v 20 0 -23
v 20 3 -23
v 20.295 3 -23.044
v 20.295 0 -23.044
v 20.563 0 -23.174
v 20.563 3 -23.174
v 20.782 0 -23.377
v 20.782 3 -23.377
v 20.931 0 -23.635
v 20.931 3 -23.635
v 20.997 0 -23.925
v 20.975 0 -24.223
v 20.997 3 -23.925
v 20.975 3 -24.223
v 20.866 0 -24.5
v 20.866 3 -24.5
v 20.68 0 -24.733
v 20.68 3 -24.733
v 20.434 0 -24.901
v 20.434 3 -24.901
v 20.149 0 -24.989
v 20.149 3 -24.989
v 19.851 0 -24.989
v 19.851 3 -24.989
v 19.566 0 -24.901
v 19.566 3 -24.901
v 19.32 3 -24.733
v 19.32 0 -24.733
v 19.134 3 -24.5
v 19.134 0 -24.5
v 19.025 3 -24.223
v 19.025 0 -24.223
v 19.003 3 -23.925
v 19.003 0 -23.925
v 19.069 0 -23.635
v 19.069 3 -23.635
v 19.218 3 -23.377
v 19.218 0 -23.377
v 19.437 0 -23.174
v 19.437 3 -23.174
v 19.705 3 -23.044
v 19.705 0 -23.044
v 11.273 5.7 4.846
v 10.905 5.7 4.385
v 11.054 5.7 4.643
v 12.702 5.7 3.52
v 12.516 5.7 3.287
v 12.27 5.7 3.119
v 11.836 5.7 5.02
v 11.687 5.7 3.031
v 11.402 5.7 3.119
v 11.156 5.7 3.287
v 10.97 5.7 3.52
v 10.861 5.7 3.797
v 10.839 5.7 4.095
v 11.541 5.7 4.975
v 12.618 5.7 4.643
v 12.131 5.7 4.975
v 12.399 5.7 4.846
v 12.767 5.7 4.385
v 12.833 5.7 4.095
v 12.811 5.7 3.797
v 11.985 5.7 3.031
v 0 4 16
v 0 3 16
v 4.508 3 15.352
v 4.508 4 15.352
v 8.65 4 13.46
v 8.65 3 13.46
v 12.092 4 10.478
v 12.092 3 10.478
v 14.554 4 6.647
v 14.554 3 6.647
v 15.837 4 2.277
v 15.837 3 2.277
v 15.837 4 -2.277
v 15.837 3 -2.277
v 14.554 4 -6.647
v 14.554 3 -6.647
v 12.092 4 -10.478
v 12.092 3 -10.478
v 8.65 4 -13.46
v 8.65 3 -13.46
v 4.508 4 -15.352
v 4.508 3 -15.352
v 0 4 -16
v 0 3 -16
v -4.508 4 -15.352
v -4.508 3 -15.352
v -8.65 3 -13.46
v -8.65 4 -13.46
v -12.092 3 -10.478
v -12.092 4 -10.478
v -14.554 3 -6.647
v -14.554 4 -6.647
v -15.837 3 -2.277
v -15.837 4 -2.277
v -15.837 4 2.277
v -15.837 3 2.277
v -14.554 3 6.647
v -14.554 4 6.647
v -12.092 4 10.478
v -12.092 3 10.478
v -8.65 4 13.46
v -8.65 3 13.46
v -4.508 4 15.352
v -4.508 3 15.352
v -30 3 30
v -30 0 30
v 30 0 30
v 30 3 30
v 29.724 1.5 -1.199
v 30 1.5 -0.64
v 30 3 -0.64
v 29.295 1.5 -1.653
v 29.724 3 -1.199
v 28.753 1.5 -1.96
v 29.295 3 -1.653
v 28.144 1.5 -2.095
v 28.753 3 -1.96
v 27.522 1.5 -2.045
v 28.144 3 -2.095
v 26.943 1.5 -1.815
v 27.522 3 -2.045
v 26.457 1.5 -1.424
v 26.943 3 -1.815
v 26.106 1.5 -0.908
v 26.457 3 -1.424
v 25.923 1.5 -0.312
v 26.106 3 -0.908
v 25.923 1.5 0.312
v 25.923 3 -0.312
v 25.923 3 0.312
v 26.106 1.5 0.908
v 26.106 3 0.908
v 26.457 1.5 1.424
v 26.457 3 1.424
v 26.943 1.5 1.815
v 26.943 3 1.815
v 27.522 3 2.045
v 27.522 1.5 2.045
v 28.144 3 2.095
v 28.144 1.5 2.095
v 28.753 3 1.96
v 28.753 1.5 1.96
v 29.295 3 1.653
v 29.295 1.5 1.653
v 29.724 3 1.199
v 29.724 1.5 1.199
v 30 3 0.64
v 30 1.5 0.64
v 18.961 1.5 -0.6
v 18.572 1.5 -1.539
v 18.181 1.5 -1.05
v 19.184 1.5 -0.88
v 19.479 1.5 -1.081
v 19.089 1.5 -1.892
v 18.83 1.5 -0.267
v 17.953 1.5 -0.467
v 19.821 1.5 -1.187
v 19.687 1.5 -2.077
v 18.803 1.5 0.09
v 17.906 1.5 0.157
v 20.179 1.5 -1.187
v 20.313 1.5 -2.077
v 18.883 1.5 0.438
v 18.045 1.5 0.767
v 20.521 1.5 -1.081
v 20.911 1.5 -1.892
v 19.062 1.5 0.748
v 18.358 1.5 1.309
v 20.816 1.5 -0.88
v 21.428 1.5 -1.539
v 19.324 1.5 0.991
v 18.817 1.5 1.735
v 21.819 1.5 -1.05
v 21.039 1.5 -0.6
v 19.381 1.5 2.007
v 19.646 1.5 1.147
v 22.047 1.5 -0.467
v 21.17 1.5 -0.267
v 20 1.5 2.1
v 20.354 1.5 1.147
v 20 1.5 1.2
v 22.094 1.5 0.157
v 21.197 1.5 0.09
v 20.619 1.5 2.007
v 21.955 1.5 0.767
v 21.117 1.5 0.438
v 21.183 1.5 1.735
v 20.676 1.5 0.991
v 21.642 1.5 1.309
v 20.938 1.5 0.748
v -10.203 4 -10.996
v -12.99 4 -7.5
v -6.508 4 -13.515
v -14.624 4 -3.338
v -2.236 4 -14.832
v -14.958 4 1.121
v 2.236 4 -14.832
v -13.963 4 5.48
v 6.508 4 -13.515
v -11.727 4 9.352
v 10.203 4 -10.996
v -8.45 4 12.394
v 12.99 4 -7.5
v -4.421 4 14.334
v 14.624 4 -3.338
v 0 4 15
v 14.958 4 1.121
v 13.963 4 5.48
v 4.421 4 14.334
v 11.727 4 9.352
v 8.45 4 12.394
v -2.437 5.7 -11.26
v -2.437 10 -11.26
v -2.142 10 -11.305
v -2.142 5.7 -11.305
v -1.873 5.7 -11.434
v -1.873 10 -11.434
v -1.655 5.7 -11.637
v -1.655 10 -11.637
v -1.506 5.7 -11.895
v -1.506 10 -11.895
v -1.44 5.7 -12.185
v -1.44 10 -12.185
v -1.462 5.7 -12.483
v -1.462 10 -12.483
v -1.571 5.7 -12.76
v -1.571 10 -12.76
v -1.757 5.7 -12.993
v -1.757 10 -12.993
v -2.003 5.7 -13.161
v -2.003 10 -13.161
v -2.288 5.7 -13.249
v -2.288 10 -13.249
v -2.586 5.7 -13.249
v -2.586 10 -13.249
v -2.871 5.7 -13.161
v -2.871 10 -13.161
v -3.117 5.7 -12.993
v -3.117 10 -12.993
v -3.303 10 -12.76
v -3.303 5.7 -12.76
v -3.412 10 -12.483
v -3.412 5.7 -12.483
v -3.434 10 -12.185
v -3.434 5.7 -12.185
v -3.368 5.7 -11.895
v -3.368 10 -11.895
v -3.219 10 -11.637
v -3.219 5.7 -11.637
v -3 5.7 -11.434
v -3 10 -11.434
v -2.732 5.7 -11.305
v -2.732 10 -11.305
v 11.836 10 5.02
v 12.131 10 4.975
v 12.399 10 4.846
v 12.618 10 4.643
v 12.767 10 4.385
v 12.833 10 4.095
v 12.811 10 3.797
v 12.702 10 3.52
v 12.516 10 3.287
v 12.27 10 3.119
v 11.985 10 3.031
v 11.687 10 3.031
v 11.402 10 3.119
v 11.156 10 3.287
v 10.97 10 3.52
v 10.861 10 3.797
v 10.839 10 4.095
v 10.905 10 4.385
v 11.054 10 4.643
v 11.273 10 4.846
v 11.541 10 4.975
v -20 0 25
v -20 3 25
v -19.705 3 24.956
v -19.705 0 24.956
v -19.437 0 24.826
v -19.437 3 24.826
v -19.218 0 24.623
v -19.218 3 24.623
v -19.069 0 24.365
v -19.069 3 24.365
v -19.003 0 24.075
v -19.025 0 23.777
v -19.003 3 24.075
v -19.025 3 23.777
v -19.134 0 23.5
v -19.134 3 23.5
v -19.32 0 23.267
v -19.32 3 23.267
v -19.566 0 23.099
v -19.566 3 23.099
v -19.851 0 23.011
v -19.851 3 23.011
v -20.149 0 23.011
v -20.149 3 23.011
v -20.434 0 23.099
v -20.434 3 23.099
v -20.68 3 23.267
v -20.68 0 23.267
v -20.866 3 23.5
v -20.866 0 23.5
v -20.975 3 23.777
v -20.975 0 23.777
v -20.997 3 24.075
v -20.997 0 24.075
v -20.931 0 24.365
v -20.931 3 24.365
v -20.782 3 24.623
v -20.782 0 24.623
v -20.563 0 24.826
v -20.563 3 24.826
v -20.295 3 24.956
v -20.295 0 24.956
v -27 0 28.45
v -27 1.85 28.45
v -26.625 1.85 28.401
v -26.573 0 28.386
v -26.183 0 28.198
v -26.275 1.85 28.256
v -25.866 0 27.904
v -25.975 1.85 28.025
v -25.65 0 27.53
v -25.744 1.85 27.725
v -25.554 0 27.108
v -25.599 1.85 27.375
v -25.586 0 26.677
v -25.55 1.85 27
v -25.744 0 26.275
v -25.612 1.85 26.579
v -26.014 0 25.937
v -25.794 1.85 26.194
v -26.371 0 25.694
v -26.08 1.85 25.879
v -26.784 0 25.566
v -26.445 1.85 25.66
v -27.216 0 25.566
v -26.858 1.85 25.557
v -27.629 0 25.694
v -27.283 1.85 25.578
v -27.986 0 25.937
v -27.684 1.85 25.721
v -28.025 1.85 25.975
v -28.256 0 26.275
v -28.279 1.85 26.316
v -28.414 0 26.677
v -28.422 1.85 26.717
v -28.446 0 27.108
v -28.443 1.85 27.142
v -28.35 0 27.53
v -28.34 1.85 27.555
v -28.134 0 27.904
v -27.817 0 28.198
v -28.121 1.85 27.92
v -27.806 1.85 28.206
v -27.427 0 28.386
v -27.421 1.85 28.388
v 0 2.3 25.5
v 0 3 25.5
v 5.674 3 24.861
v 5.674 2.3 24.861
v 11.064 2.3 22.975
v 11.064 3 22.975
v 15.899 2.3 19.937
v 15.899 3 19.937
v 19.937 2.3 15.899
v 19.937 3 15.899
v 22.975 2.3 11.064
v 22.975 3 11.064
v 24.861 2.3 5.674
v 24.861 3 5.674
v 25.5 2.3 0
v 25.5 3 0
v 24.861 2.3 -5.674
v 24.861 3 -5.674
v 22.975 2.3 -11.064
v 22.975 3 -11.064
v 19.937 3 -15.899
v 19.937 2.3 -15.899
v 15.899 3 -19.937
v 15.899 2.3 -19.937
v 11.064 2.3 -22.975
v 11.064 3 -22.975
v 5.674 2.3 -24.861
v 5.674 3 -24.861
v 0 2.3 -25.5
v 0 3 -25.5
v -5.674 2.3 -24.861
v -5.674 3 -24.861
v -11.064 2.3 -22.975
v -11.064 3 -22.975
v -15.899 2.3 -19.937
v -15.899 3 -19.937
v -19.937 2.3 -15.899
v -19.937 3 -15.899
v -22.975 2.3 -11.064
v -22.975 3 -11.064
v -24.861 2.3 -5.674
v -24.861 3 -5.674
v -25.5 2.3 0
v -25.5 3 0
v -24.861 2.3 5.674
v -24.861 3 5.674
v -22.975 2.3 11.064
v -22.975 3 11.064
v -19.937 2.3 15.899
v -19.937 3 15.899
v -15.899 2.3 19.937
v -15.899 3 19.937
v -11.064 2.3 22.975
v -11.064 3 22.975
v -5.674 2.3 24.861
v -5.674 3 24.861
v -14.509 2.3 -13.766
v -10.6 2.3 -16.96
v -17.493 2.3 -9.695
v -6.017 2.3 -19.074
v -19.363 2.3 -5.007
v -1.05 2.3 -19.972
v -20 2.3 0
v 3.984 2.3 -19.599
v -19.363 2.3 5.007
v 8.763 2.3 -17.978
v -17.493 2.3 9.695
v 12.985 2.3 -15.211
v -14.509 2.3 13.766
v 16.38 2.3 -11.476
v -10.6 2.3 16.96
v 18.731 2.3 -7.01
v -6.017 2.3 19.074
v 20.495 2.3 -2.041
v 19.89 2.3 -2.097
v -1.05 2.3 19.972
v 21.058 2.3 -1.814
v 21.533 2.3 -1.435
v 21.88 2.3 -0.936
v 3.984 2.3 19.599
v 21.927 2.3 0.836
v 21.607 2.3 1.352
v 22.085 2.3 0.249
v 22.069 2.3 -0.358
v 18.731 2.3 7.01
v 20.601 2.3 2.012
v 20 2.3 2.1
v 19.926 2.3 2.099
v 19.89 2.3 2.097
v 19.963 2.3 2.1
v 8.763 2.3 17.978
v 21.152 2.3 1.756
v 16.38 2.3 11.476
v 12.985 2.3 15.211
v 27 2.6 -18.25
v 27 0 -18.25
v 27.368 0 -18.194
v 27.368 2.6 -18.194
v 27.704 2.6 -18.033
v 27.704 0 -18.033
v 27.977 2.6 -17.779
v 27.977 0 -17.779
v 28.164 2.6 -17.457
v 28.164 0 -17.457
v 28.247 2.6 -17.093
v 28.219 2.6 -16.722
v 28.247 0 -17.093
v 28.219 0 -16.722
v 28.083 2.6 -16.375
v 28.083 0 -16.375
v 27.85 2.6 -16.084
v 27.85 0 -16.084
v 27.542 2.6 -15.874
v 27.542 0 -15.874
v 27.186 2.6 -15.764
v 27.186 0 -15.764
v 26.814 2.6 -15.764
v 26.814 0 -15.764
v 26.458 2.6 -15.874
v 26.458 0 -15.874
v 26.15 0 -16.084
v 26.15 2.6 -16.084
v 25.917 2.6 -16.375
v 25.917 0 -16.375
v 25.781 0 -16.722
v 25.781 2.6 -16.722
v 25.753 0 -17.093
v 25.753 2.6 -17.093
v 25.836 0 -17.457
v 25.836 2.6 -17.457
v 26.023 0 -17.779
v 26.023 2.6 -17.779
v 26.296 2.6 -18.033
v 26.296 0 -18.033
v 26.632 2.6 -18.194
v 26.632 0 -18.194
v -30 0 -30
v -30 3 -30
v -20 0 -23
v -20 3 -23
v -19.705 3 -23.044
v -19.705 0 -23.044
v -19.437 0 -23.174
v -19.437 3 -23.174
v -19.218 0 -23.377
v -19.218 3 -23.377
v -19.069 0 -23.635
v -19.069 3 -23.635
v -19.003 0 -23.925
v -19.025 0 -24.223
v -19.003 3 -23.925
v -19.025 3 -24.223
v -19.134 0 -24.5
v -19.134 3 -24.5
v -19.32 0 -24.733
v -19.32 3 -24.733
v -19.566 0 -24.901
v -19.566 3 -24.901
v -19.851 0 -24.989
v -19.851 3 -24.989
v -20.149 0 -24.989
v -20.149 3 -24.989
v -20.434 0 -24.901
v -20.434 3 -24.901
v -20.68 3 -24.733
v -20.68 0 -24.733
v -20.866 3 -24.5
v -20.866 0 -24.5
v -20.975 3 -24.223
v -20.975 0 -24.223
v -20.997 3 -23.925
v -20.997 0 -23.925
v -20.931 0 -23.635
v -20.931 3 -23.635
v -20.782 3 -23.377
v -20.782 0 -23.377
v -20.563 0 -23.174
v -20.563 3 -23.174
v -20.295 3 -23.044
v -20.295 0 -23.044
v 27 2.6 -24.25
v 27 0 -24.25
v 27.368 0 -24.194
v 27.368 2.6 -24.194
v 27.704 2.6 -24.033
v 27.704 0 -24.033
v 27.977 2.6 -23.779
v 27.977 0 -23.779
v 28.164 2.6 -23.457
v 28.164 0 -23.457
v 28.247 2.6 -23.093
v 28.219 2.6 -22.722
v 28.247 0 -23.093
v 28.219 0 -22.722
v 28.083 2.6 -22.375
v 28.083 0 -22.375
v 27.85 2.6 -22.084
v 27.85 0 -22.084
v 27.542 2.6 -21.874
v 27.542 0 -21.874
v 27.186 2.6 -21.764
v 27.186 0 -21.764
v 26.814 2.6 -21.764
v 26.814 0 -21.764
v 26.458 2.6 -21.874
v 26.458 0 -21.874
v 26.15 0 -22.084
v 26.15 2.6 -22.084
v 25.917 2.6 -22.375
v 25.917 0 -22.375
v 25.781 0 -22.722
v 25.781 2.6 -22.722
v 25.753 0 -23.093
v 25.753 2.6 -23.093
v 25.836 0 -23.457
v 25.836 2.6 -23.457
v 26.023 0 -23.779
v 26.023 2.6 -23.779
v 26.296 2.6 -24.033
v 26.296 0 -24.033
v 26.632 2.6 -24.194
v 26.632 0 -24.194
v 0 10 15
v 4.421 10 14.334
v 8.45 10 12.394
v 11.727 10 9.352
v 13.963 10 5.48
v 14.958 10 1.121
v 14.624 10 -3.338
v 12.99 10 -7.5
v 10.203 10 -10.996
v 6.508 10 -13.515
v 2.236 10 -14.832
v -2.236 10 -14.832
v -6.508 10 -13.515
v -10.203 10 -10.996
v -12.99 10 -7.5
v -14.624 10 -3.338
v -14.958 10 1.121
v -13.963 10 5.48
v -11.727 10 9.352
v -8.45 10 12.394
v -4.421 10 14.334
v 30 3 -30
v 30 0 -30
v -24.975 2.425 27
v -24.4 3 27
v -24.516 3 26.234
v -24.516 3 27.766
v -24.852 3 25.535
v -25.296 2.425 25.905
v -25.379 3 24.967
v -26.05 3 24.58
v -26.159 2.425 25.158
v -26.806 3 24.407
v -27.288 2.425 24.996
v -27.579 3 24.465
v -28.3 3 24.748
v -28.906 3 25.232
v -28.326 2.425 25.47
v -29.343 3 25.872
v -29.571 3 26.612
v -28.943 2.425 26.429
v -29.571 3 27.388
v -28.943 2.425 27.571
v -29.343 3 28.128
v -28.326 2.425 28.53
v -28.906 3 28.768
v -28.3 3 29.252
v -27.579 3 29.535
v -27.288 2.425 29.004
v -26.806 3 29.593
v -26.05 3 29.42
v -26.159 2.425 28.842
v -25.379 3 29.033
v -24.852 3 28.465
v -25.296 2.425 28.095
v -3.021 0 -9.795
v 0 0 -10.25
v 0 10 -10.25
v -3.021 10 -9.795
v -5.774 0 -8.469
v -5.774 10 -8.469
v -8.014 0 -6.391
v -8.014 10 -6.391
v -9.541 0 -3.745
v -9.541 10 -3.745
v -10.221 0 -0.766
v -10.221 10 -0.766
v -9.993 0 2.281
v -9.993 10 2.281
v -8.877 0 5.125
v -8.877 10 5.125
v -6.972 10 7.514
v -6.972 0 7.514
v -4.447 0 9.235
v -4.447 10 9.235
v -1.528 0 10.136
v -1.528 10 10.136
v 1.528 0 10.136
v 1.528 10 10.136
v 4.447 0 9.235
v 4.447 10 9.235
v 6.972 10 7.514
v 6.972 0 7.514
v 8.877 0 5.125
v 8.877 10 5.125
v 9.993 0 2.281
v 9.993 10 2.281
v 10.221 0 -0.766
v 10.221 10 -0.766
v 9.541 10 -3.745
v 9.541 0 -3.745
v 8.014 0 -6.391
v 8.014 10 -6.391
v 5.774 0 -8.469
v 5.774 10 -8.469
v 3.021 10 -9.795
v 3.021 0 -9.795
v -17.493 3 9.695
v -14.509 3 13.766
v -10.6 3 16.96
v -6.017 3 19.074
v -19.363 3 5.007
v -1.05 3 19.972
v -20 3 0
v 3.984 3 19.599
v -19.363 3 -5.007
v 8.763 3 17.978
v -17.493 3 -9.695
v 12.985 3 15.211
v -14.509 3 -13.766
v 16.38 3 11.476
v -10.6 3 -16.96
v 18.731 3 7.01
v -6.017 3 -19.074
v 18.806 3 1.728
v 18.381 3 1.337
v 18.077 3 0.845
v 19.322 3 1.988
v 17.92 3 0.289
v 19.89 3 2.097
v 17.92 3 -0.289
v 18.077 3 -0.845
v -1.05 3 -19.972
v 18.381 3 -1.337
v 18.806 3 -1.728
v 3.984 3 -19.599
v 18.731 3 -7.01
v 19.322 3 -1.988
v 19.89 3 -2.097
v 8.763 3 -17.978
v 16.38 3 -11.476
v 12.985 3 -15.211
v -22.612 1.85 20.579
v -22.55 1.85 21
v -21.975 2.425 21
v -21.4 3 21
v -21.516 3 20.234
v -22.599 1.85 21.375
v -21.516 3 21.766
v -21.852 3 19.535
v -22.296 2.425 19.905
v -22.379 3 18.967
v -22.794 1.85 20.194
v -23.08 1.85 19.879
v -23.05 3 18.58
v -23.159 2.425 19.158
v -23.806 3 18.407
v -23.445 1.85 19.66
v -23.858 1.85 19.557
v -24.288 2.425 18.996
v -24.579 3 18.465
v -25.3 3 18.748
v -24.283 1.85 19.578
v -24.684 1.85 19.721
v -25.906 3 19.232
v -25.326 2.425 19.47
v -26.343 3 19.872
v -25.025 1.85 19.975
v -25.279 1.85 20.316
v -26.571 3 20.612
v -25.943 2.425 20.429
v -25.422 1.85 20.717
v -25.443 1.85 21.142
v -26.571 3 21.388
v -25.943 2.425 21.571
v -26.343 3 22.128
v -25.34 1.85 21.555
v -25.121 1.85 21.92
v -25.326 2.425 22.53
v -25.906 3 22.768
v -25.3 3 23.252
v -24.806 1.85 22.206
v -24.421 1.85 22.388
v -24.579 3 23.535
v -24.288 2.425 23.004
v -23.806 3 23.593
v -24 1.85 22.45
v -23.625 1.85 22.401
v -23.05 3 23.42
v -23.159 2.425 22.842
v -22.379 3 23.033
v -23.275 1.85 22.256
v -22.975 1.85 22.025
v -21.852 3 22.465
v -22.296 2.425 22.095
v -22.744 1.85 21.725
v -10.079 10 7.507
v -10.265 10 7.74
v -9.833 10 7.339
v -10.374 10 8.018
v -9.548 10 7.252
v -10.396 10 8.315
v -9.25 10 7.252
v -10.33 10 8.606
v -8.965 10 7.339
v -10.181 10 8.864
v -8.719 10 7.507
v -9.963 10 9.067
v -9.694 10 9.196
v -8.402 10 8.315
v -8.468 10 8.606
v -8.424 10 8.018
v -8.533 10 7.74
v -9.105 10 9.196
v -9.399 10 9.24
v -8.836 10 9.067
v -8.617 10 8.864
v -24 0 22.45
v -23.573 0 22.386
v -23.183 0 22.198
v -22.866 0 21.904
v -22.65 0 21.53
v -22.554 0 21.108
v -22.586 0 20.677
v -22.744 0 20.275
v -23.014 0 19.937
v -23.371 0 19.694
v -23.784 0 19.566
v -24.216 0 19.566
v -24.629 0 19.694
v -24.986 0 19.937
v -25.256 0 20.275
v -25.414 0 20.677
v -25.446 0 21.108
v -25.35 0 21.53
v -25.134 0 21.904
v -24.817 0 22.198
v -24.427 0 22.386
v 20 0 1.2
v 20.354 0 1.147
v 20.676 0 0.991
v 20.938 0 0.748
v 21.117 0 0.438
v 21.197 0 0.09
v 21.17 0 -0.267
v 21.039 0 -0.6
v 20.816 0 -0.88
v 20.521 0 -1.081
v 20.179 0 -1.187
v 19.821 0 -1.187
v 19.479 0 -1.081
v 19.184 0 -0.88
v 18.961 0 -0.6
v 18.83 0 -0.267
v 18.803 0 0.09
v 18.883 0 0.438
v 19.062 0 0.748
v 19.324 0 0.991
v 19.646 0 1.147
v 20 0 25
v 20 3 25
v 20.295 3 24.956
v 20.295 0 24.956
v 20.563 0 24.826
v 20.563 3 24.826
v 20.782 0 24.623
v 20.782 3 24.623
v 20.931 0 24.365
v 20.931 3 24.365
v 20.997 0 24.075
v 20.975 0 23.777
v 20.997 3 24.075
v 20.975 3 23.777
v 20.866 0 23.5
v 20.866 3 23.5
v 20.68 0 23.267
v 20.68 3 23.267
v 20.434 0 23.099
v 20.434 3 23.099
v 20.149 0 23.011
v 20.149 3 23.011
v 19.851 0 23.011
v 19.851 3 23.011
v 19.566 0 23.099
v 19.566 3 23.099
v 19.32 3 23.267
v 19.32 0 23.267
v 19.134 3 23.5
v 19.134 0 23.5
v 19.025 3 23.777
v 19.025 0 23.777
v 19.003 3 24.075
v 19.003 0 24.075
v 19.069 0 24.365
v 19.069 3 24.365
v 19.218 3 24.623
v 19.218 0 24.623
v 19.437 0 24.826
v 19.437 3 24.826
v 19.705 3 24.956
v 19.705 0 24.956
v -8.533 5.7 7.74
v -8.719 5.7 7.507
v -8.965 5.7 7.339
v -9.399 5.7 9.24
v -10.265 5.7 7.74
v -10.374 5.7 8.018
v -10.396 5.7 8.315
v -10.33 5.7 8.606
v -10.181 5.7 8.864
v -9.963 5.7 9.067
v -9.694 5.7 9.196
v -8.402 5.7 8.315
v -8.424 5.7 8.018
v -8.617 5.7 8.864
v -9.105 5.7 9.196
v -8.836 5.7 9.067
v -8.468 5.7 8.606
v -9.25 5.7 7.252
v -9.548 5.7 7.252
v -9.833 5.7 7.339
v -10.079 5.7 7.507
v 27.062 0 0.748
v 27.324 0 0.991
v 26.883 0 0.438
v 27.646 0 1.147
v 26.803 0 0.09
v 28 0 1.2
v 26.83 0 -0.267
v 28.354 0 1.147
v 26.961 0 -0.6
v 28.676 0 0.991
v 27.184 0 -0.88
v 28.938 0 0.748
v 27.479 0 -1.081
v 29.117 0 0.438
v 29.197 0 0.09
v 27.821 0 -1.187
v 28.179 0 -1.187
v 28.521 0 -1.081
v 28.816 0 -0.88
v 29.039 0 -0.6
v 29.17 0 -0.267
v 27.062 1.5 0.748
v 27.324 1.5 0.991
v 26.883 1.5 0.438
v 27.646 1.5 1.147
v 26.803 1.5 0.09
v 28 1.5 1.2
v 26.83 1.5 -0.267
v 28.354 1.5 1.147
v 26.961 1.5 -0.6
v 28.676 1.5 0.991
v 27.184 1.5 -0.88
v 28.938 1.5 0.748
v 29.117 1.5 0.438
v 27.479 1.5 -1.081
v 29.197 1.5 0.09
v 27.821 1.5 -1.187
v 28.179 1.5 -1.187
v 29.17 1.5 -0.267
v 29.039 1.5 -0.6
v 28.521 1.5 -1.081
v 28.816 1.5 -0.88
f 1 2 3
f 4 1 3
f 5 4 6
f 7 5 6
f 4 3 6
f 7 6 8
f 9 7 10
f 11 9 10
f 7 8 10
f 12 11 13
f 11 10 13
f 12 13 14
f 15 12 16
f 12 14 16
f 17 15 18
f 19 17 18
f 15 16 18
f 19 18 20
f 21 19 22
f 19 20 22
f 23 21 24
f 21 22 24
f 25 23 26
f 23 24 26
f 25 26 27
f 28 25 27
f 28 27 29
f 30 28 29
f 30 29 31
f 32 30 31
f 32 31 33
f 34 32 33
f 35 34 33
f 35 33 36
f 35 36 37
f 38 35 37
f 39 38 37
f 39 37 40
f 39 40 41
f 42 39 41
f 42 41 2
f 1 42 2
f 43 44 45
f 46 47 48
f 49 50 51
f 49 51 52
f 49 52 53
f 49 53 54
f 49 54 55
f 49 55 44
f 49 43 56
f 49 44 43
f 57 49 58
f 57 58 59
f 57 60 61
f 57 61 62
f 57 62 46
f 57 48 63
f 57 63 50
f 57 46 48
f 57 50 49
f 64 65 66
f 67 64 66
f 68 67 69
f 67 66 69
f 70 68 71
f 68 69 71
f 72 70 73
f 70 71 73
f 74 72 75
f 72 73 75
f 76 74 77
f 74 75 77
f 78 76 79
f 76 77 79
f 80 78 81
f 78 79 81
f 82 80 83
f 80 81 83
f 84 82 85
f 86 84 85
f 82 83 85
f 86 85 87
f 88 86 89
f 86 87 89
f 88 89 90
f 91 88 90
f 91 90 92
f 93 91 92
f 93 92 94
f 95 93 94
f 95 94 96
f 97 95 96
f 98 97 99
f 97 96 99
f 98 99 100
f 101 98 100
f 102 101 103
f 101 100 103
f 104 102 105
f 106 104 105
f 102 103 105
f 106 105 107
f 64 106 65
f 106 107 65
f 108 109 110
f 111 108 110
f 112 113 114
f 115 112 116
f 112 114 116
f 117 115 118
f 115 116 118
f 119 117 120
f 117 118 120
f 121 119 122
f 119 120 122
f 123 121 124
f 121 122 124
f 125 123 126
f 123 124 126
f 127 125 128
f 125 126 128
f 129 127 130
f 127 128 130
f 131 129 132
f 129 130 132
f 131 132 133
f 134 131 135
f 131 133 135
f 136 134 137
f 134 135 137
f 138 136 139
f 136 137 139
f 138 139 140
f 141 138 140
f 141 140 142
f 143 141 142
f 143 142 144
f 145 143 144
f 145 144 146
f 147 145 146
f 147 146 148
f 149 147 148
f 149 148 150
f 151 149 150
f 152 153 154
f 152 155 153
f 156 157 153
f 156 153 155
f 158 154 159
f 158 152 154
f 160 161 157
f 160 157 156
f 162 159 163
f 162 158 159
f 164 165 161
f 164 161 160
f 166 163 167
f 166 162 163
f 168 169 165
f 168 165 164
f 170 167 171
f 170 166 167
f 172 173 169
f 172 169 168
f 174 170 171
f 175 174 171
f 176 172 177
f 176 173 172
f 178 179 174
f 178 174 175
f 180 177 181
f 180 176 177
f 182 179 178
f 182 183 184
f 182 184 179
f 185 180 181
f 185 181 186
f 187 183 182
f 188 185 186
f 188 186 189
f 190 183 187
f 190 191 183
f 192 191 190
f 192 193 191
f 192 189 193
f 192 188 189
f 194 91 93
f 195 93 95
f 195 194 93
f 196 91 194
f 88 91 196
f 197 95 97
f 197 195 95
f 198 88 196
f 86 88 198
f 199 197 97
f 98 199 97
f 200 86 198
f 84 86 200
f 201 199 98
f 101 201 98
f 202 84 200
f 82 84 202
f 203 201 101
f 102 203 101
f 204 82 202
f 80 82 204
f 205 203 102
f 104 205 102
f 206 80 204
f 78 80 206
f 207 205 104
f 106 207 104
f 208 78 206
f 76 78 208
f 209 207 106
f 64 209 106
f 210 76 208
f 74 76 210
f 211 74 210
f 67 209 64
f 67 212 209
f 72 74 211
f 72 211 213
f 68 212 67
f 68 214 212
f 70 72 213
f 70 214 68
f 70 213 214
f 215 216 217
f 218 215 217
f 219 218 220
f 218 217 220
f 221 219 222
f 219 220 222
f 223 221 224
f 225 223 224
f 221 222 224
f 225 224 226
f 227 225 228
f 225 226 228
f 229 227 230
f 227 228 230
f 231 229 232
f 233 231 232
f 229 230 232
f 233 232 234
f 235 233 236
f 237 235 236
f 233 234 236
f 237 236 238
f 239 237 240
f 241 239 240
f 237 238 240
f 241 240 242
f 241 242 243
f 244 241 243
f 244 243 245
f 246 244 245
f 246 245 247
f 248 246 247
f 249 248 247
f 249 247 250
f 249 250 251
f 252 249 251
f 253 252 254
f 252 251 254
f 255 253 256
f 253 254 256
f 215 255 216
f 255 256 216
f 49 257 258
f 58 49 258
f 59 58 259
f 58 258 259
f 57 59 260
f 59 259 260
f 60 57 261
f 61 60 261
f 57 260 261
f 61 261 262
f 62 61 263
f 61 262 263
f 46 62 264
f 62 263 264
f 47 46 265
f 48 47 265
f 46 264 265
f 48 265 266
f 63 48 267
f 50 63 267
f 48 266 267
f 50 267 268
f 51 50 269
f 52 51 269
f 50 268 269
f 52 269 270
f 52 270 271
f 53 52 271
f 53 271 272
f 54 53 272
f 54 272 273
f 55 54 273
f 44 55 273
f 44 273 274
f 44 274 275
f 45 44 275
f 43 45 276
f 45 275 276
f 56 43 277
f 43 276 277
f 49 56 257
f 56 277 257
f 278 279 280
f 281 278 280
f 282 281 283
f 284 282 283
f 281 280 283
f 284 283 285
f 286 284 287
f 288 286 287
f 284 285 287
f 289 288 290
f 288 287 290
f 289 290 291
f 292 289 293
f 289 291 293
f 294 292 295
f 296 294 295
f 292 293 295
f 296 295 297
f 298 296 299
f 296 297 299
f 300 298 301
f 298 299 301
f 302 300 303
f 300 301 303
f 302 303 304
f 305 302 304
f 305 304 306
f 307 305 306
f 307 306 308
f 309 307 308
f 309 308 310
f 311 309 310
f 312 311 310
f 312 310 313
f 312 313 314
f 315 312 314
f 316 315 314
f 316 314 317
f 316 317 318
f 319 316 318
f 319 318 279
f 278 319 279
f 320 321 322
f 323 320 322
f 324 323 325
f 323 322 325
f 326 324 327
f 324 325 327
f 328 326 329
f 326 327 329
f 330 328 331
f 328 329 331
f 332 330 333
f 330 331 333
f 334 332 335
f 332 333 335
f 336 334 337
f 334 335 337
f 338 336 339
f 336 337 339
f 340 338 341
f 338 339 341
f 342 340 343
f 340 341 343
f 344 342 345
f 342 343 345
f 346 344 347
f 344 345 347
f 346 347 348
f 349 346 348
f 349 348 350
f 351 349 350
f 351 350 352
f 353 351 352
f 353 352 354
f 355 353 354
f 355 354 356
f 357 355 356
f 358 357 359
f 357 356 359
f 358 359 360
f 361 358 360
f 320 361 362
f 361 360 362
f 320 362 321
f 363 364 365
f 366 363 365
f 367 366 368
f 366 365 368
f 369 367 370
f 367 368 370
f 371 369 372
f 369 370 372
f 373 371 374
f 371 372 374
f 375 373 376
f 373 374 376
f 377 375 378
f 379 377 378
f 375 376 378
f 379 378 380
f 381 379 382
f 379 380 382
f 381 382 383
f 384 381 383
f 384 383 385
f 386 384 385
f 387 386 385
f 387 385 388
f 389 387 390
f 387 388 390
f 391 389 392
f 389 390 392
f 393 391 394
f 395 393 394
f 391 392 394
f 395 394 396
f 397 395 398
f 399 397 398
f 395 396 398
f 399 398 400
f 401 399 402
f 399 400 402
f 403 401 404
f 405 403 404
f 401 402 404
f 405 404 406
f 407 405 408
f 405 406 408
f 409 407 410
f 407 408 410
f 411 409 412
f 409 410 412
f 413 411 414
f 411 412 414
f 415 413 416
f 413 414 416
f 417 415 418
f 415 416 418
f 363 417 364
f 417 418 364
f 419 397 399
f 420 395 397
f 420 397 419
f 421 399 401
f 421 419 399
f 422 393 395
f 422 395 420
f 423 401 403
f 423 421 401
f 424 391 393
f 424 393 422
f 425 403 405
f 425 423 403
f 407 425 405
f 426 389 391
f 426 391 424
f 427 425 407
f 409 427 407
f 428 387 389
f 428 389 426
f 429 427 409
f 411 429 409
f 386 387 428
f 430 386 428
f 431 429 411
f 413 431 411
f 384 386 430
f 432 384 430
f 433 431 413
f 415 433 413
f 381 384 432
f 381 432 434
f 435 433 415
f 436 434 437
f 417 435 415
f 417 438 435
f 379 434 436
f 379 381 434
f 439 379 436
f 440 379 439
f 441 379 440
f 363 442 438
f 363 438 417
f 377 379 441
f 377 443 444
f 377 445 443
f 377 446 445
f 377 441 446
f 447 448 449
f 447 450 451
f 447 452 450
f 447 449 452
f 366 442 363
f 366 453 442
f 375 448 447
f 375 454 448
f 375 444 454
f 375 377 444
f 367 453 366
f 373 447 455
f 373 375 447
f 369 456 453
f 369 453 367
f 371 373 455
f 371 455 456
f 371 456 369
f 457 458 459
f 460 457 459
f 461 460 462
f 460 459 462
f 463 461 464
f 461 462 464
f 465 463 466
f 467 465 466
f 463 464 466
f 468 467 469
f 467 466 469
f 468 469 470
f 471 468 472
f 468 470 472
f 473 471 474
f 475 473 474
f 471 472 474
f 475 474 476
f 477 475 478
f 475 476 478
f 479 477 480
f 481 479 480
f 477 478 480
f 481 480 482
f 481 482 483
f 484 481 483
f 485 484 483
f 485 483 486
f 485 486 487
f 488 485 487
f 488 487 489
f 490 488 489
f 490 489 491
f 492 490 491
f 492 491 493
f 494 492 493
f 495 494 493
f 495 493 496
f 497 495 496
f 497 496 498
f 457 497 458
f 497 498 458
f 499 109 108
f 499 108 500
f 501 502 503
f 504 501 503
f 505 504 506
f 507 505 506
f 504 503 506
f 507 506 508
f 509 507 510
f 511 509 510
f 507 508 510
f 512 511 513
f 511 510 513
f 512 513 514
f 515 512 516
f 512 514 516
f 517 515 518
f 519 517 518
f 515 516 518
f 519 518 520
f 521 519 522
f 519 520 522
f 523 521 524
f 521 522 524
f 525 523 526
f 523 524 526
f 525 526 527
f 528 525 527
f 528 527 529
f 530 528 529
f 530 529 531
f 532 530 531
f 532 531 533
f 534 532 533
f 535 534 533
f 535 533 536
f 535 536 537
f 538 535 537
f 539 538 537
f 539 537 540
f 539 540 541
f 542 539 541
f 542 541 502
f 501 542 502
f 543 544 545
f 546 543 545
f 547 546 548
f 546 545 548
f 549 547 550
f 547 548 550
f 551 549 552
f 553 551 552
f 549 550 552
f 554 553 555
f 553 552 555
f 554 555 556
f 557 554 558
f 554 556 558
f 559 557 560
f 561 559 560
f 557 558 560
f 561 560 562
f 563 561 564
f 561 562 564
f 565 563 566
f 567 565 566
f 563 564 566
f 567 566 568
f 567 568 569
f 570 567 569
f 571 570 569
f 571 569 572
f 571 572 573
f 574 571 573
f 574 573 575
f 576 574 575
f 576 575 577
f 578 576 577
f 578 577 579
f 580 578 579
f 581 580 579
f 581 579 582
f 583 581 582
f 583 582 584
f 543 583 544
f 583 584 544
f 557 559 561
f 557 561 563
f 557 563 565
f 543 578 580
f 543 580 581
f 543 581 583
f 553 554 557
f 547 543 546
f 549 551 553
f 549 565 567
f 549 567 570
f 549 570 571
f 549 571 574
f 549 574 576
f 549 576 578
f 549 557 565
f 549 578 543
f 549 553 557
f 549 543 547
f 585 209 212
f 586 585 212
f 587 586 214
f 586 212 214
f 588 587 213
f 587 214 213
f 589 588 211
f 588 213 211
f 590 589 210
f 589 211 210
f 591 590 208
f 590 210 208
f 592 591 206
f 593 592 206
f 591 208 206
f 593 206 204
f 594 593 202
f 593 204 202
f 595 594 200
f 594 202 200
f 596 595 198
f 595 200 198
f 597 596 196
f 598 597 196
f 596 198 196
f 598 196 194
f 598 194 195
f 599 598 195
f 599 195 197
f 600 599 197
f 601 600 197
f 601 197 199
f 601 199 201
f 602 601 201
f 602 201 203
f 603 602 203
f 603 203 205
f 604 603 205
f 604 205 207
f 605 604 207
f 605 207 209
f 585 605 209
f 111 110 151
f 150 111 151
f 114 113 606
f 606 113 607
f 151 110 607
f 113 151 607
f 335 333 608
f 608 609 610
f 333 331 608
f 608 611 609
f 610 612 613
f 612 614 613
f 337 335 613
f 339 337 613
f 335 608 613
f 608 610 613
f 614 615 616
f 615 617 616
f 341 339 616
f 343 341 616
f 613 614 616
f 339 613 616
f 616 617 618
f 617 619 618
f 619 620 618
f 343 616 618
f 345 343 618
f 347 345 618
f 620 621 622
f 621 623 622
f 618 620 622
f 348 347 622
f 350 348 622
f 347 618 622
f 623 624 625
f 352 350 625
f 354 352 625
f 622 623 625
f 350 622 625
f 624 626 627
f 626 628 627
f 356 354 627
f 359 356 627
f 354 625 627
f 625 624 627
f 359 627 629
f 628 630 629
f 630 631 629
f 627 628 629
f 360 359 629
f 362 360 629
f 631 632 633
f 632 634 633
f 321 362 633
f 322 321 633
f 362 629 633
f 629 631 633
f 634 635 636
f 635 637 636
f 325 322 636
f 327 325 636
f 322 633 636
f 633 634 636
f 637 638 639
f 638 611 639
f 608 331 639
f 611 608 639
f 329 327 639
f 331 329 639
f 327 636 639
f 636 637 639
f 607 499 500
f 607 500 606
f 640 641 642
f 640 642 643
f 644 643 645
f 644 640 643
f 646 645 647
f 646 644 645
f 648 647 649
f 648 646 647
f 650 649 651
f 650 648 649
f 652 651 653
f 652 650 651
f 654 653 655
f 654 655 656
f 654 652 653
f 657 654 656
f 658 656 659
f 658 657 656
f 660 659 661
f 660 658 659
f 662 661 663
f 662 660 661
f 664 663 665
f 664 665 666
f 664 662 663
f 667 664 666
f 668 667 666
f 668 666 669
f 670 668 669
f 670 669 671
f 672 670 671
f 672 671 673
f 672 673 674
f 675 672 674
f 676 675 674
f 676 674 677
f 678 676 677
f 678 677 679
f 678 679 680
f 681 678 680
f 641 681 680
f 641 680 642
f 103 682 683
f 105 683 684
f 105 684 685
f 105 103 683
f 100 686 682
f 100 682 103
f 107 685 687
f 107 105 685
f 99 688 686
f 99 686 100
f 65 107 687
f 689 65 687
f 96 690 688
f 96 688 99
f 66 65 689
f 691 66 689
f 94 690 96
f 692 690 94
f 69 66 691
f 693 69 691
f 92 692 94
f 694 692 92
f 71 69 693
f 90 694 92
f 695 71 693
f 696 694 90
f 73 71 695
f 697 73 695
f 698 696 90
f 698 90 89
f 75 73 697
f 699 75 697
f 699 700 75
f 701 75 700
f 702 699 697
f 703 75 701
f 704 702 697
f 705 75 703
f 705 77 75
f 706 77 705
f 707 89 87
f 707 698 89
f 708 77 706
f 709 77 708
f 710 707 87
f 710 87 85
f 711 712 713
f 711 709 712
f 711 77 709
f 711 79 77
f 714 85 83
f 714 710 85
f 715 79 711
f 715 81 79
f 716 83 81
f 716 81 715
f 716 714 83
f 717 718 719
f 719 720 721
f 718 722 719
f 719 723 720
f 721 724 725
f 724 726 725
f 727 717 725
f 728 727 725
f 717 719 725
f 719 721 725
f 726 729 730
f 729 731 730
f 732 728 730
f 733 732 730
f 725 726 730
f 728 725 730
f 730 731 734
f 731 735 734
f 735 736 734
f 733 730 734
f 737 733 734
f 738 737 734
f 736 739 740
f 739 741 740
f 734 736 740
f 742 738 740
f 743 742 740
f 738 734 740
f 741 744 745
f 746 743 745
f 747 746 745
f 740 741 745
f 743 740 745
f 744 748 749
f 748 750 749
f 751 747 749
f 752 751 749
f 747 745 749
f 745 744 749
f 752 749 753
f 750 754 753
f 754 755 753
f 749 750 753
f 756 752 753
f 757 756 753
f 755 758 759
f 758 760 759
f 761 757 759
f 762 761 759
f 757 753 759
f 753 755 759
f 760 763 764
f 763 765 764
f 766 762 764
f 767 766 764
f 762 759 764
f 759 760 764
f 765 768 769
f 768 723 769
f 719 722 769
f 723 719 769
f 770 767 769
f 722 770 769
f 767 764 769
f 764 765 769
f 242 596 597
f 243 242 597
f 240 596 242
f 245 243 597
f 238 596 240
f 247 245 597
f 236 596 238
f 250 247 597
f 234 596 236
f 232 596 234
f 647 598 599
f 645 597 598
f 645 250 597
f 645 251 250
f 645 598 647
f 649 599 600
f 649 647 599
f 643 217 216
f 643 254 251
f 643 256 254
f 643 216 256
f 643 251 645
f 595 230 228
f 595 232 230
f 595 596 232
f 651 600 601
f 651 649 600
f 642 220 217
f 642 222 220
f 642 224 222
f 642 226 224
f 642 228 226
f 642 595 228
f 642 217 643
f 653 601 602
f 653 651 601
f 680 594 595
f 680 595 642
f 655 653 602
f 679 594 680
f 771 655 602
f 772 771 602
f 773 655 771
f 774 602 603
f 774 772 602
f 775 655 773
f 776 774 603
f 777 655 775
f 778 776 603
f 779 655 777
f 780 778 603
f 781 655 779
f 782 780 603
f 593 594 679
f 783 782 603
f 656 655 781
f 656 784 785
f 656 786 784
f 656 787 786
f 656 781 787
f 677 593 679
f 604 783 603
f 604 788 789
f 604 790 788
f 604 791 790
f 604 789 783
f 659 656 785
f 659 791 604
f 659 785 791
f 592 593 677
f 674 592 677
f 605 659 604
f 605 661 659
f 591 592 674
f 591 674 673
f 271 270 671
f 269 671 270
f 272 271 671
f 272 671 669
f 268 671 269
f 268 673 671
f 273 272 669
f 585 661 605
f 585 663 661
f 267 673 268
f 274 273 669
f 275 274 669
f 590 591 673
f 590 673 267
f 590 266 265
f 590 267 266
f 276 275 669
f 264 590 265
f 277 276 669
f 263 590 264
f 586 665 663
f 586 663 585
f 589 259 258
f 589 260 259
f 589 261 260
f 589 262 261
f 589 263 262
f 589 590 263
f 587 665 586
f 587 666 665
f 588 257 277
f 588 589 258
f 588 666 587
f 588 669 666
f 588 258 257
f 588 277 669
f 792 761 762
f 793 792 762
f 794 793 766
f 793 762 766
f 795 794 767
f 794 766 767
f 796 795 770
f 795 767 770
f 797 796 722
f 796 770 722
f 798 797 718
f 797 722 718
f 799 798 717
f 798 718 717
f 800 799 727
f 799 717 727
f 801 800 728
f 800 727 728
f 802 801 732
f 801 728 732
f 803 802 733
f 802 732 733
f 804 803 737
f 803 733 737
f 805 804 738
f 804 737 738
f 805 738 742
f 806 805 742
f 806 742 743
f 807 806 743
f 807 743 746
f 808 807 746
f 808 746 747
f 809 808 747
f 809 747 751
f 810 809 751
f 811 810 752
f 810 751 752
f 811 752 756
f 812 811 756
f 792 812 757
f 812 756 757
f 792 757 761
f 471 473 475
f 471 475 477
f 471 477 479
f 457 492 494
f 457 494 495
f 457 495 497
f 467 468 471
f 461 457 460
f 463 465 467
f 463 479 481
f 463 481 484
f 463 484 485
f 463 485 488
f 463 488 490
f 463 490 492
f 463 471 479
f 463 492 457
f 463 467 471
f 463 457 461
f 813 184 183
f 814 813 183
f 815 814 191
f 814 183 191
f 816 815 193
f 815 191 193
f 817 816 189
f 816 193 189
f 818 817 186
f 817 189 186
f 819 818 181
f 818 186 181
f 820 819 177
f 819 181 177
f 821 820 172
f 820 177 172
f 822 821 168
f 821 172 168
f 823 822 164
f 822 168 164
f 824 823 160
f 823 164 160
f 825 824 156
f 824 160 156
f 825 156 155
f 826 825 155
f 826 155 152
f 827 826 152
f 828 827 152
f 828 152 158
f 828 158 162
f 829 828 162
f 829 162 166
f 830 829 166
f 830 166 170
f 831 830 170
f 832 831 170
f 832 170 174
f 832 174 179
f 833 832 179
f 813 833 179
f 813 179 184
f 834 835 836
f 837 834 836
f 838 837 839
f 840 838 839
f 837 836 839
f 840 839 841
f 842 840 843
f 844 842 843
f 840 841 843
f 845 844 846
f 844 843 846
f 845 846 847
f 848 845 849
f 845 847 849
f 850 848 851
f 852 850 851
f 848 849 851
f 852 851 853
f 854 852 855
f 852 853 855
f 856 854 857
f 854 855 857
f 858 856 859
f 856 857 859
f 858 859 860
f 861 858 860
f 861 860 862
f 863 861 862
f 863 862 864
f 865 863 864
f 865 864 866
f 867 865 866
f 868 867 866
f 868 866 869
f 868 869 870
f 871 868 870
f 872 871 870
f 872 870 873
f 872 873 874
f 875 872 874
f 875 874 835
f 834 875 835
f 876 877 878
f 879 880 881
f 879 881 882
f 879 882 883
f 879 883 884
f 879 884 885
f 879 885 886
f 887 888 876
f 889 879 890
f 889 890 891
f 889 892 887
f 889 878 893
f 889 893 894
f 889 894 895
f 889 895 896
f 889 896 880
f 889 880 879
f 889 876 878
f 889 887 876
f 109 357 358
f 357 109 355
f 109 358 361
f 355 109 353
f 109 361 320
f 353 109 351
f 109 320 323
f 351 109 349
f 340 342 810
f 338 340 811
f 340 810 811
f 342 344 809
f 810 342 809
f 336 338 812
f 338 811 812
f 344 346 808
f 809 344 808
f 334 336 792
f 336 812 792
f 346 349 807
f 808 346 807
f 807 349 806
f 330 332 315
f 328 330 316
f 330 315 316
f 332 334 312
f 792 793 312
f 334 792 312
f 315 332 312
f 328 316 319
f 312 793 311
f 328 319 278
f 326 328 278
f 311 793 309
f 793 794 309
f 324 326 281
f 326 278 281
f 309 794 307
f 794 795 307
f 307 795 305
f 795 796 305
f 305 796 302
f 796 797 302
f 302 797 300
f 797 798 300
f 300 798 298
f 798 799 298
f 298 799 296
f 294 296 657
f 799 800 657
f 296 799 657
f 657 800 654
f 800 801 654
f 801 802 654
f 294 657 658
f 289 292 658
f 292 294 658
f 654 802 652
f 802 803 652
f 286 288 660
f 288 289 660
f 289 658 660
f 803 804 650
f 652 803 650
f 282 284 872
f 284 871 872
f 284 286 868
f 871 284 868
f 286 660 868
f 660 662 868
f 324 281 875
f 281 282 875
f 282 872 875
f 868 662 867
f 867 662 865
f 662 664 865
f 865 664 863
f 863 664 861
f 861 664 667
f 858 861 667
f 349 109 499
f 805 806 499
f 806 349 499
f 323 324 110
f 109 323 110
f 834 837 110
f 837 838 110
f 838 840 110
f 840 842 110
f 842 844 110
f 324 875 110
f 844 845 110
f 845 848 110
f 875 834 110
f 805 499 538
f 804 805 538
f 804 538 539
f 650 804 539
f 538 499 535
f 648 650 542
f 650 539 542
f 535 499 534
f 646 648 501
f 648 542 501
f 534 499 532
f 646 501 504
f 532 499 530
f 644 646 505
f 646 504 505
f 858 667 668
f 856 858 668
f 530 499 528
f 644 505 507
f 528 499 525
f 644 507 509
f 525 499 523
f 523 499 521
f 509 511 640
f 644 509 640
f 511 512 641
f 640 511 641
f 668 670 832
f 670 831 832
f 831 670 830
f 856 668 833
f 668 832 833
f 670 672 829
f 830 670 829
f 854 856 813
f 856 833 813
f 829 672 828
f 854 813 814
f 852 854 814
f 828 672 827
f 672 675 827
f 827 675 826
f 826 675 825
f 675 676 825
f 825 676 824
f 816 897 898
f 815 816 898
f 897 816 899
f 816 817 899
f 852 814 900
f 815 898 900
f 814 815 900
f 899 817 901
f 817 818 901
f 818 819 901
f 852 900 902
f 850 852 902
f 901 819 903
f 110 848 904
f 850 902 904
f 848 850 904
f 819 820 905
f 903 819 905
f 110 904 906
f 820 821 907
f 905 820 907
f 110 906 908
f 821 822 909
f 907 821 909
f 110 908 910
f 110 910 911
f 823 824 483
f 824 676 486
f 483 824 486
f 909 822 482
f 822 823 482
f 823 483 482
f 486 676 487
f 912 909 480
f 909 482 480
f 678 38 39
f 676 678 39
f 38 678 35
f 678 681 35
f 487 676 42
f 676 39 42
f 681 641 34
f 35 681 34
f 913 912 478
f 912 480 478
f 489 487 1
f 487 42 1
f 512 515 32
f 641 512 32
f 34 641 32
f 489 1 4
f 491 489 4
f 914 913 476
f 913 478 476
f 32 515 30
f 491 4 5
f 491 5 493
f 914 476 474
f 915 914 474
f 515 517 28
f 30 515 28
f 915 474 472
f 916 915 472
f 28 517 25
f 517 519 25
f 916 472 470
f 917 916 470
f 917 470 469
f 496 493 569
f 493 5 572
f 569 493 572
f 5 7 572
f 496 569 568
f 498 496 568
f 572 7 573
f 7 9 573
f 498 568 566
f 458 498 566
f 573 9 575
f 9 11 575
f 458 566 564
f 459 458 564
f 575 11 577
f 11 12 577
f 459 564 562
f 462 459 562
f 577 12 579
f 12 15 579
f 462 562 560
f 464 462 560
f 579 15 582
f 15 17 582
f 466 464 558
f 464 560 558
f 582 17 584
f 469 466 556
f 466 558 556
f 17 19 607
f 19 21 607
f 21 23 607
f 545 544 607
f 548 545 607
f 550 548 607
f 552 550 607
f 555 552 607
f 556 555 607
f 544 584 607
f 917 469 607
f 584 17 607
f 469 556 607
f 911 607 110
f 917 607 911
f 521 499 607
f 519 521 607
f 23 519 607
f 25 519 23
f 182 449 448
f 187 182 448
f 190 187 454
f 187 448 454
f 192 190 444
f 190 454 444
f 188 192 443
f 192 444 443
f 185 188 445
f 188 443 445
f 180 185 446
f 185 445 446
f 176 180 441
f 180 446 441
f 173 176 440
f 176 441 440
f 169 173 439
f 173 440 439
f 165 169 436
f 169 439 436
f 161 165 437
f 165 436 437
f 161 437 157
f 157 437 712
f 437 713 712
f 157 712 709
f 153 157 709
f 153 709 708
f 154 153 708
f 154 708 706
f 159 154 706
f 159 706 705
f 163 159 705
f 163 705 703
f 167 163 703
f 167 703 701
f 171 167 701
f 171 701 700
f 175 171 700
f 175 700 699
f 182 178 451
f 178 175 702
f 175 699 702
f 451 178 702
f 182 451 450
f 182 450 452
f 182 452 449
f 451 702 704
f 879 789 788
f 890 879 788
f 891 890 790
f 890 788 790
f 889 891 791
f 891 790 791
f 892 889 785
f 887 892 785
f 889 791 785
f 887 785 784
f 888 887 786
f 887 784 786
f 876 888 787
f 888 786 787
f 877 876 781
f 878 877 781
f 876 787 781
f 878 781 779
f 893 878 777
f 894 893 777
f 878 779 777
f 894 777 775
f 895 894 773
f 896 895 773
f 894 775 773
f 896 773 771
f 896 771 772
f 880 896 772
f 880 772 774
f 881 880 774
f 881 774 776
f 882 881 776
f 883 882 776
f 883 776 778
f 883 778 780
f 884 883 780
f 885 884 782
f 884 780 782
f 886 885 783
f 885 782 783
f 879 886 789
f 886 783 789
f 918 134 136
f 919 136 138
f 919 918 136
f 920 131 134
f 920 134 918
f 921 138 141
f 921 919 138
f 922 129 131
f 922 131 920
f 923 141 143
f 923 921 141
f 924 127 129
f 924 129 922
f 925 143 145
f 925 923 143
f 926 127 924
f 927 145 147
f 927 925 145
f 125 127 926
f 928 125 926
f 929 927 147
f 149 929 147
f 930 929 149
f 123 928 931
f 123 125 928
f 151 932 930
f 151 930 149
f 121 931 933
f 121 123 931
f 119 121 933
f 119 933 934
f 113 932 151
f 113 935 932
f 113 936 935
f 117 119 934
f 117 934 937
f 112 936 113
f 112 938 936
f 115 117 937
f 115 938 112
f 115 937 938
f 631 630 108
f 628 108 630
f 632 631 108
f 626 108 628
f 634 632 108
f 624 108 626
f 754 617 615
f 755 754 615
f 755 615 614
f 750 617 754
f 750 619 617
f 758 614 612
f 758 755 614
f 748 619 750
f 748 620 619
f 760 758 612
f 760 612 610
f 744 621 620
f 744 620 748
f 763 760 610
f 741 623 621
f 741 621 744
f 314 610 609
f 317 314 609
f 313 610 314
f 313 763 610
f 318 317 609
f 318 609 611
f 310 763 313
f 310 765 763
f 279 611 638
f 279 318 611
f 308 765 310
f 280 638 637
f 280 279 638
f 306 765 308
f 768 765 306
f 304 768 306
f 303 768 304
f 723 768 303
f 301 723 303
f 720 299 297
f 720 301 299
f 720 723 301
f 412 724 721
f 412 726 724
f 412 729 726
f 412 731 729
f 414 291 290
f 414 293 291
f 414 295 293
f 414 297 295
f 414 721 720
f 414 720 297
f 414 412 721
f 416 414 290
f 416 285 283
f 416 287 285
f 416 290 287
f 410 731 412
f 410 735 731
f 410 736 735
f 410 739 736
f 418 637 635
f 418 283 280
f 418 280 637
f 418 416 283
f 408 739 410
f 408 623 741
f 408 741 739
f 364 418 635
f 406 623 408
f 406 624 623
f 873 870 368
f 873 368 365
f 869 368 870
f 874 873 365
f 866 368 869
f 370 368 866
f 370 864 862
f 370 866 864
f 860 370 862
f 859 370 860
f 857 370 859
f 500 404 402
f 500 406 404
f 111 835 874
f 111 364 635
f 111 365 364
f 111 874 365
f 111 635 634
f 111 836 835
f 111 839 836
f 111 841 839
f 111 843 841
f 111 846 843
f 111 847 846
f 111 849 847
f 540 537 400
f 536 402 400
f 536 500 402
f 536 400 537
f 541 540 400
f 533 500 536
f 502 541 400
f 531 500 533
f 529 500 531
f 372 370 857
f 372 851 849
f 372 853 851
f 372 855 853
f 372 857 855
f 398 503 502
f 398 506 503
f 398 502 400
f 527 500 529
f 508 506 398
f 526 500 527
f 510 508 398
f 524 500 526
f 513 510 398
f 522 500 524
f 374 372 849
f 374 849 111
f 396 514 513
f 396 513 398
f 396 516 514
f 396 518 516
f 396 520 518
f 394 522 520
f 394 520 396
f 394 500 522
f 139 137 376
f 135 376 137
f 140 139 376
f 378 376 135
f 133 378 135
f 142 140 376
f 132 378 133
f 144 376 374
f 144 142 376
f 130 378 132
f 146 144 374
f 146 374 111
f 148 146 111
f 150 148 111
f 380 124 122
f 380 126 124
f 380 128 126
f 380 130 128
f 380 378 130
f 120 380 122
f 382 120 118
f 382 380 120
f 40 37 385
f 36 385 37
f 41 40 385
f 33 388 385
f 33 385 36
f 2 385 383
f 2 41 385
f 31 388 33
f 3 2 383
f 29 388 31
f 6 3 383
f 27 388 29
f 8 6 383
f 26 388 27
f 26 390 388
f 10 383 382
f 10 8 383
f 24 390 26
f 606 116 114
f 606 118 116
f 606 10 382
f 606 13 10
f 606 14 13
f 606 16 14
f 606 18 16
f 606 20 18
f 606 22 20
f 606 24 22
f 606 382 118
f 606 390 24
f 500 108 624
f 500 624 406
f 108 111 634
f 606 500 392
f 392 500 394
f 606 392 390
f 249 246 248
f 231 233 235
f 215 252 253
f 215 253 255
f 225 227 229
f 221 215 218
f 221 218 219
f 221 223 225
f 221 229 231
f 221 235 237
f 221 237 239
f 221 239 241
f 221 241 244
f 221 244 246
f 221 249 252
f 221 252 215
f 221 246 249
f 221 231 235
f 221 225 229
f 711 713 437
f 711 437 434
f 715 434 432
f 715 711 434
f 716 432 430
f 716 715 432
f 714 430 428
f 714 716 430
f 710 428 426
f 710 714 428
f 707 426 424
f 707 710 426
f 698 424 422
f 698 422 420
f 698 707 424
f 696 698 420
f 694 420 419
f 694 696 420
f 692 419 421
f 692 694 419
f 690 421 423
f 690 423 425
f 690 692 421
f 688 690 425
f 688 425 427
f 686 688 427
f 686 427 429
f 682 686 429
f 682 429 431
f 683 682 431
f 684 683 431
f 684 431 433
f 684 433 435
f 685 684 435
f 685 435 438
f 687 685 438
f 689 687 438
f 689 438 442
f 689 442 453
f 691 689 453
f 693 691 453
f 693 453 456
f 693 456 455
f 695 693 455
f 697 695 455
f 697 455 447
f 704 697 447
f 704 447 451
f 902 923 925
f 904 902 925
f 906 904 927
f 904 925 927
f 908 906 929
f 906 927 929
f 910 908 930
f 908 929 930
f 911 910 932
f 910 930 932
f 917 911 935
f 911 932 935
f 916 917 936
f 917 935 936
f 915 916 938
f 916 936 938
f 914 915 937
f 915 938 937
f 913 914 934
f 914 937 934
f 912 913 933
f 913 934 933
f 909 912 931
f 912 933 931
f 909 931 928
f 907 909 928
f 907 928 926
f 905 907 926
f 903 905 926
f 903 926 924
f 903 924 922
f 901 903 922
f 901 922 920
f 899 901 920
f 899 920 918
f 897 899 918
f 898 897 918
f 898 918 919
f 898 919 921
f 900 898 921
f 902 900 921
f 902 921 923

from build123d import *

# Parameters (mm, degrees)
SKETCH1_W                                      = 60
SKETCH1_H                                      = 60
BOSS_EXTRUDE1_DEPTH                            = 3
SKETCH3_R                                      = 1
CUT_EXTRUDE3_DEPTH                             = 43.532340636
SKETCH5_R                                      = 10.25
CUT_EXTRUDE4_DEPTH                             = 43.532340636
SKETCH6_R                                      = 16
SKETCH6_R_2                                    = 10.25
BOSS_EXTRUDE2_DEPTH                            = 1
SKETCH7_R                                      = 15
SKETCH7_R_2                                    = 10.25
BOSS_EXTRUDE3_DEPTH                            = 7
SKETCH10_R                                     = 1.45
STOP_MOUNT_D2P9_THROUGH_DEPTH                  = 3.01
SKETCH11_R                                     = 2.6
STOP_MOUNT_CSK_D5P2_90DEG_DEPTH                = 1.15
STOP_MOUNT_CSK_D5P2_90DEG_DRAFT                = -45
STOP_MOUNT_CSK_D5P2_90DEG_PROFILE_2_DEPTH      = 1.15
STOP_MOUNT_CSK_D5P2_90DEG_PROFILE_2_DRAFT      = -45
SKETCH13_R                                     = 1.45
YTAB_D2P9_DEPTH                                = 3.01
SKETCH14_R                                     = 1.2
GUIDEBLOCK1_D2P4_DEPTH                         = 3.01
SKETCH15_R                                     = 2.1
GUIDEBLOCK1_HEADCOUNTERBORE_D4P2_DEPTH         = 1.5
SKETCH16_R                                     = 25.5
SKETCH16_R_2                                   = 20
ROTATING_RETAINER_HEAD_CLEARANCE_ANNULUS_DEPTH = 0.7
SKETCH17_R                                     = 1
INNER_RETAINER_M2_TAPPED_ENVELOPE_DEPTH        = 4.3
SKETCH18_R                                     = 1.46
YTAB_THROUGH_HOLE_BACKING_RESTORATION_DEPTH    = 3
SKETCH19_R                                     = 1.25
YTAB_BLIND_M2P5_THREAD_ENVELOPES_DEPTH         = 2.6


with BuildPart() as part:
    # Sketch1 → Boss-Extrude1 (new body)
    with BuildSketch(Plane(origin=(0, 0, 0), x_dir=(1, 0, 0), z_dir=(0, 1, 0))):
        Rectangle(SKETCH1_W, SKETCH1_H)
    extrude(amount=BOSS_EXTRUDE1_DEPTH)

    # Sketch3 → Cut-Extrude3 (cut, through all)
    with BuildSketch(Plane(origin=(0, 3, 0), x_dir=(1, 0, 0), z_dir=(0, 1, 0))):
        with Locations(Location((-20, 24, 0), (0, 0, 270))):
            Circle(SKETCH3_R)
        with Locations(Location((20, 24, 0), (0, 0, 270))):
            Circle(SKETCH3_R)
        with Locations(Location((-20, -24, 0), (0, 0, 270))):
            Circle(SKETCH3_R)
        with Locations(Location((20, -24, 0), (0, 0, 270))):
            Circle(SKETCH3_R)
    extrude(amount=-CUT_EXTRUDE3_DEPTH, mode=Mode.SUBTRACT)

    # Sketch5 → Cut-Extrude4 (cut, through all)
    with BuildSketch(Plane.XZ):
        with Locations(Location((0, 0, 0), (0, 0, 270))):
            Circle(SKETCH5_R)
    extrude(amount=-CUT_EXTRUDE4_DEPTH, mode=Mode.SUBTRACT)

    # Sketch6 → Boss-Extrude2 (add)
    with BuildSketch(Plane(origin=(0, 3, 0), x_dir=(1, 0, 0), z_dir=(0, 1, 0))):
        with Locations(Location((0, 0, 0), (0, 0, 270))):
            Circle(SKETCH6_R)
        with Locations(Location((0, 0, 0), (0, 0, 90))):
            Circle(SKETCH6_R_2, mode=Mode.SUBTRACT)
    extrude(amount=BOSS_EXTRUDE2_DEPTH)

    # Sketch7 → Boss-Extrude3 (add)
    with BuildSketch(Plane(origin=(0, 3, 0), x_dir=(1, 0, 0), z_dir=(0, 1, 0))):
        with Locations(Location((0, 0, 0), (0, 0, 270))):
            Circle(SKETCH7_R)
        with Locations(Location((0, 0, 0), (0, 0, 90))):
            Circle(SKETCH7_R_2, mode=Mode.SUBTRACT)
    extrude(amount=BOSS_EXTRUDE3_DEPTH)

    # Sketch10 → Stop_Mount_D2p9_Through (cut)
    with BuildSketch(Plane(origin=(0, 3, 0), x_dir=(1, 0, 0), z_dir=(0, 1, 0))):
        with Locations(Location((-24, -21, 0), (0, 0, 270))):
            Circle(SKETCH10_R)
        with Locations(Location((-27, -27, 0), (0, 0, 270))):
            Circle(SKETCH10_R)
    extrude(amount=-STOP_MOUNT_D2P9_THROUGH_DEPTH, mode=Mode.SUBTRACT)


with BuildPart() as stop_mount_csk_d5p2_90deg_tool:
    # Sketch11 → Stop_Mount_CSK_D5p2_90deg (with draft: the straight prism first)
    with BuildSketch(Plane(origin=(0, 3, 0), x_dir=(1, 0, 0), z_dir=(0, 1, 0))):
        with Locations((-24, -21)):
            Circle(SKETCH11_R)
    extrude(amount=-STOP_MOUNT_CSK_D5P2_90DEG_DEPTH)
    # Stop_Mount_CSK_D5p2_90deg: the draft: its side faces are tilted about the plane it starts from
    stop_mount_csk_d5p2_90deg_sides = [stop_mount_csk_d5p2_90deg_tool.faces().sort_by_distance(p)[0] for p in [
        (-26.6, 2.425, 21),
    ]]
    draft(stop_mount_csk_d5p2_90deg_sides, Plane(origin=(0, 3, 0), x_dir=(1, 0, 0), z_dir=(0, 1, 0)), STOP_MOUNT_CSK_D5P2_90DEG_DRAFT)


with BuildPart() as part_1:
    add(part.part)

    # Stop_Mount_CSK_D5p2_90deg: cut by stop_mount_csk_d5p2_90deg_tool
    add(stop_mount_csk_d5p2_90deg_tool.part, mode=Mode.SUBTRACT)


with BuildPart() as stop_mount_csk_d5p2_90deg_profile_2_tool:
    # Sketch11 → Stop_Mount_CSK_D5p2_90deg profile 2 (with draft: the straight prism first)
    with BuildSketch(Plane(origin=(0, 3, 0), x_dir=(1, 0, 0), z_dir=(0, 1, 0))):
        with Locations((-27, -27)):
            Circle(SKETCH11_R)
    extrude(amount=-STOP_MOUNT_CSK_D5P2_90DEG_PROFILE_2_DEPTH)
    # Stop_Mount_CSK_D5p2_90deg profile 2: the draft: its side faces are tilted about the plane it starts from
    stop_mount_csk_d5p2_90deg_profile_2_sides = [stop_mount_csk_d5p2_90deg_profile_2_tool.faces().sort_by_distance(p)[0] for p in [
        (-29.6, 2.425, 27),
    ]]
    draft(stop_mount_csk_d5p2_90deg_profile_2_sides, Plane(origin=(0, 3, 0), x_dir=(1, 0, 0), z_dir=(0, 1, 0)), STOP_MOUNT_CSK_D5P2_90DEG_PROFILE_2_DRAFT)


with BuildPart() as part_2:
    add(part_1.part)

    # Stop_Mount_CSK_D5p2_90deg profile 2: cut by stop_mount_csk_d5p2_90deg_profile_2_tool
    add(stop_mount_csk_d5p2_90deg_profile_2_tool.part, mode=Mode.SUBTRACT)

    # Sketch13 → YTab_D2p9 (cut)
    with BuildSketch(Plane.XZ):
        with Locations(Location((27, -23, 0), (0, 0, 270))):
            Circle(SKETCH13_R)
        with Locations(Location((27, -17, 0), (0, 0, 270))):
            Circle(SKETCH13_R)
    extrude(amount=-YTAB_D2P9_DEPTH, mode=Mode.SUBTRACT)

    # Sketch14 → GuideBlock1_D2p4 (cut)
    with BuildSketch(Plane(origin=(0, 3, 0), x_dir=(1, 0, 0), z_dir=(0, 1, 0))):
        with Locations(Location((28, 0, 0), (0, 0, 270))):
            Circle(SKETCH14_R)
        with Locations(Location((20, 0, 0), (0, 0, 270))):
            Circle(SKETCH14_R)
    extrude(amount=-GUIDEBLOCK1_D2P4_DEPTH, mode=Mode.SUBTRACT)

    # Sketch15 → GuideBlock1_HeadCounterbore_D4p2 (cut)
    with BuildSketch(Plane(origin=(0, 3, 0), x_dir=(1, 0, 0), z_dir=(0, 1, 0))):
        with Locations((28, 0)):
            Circle(SKETCH15_R)
        with Locations(Location((20, 0, 0), (0, 0, 270))):
            Circle(SKETCH15_R)
    extrude(amount=-GUIDEBLOCK1_HEADCOUNTERBORE_D4P2_DEPTH, mode=Mode.SUBTRACT)

    # Sketch16 → Rotating_Retainer_Head_Clearance_Annulus (cut)
    with BuildSketch(Plane(origin=(0, 3, 0), x_dir=(1, 0, 0), z_dir=(0, 1, 0))):
        with Locations(Location((0, 0, 0), (0, 0, 270))):
            Circle(SKETCH16_R)
        Circle(SKETCH16_R_2, mode=Mode.SUBTRACT)
    extrude(amount=-ROTATING_RETAINER_HEAD_CLEARANCE_ANNULUS_DEPTH, mode=Mode.SUBTRACT)

    # Sketch17 → Inner_Retainer_M2_Tapped_Envelope (cut)
    with BuildSketch(Plane(origin=(0, 10, 0), x_dir=(1, 0, 0), z_dir=(0, 1, 0))):
        with Locations(Location((-9.399263552, -8.240378916, 0), (0, 0, 270))):
            Circle(SKETCH17_R)
        with Locations(Location((-2.436745703, 12.260190471, 0), (0, 0, 270))):
            Circle(SKETCH17_R)
        with Locations(Location((11.836009254, -4.019811554, 0), (0, 0, 270))):
            Circle(SKETCH17_R)
    extrude(amount=-INNER_RETAINER_M2_TAPPED_ENVELOPE_DEPTH, mode=Mode.SUBTRACT)

    # Sketch18 → YTab_Through_Hole_Backing_Restoration (add)
    with BuildSketch(Plane.XZ):
        with Locations((27, -23)):
            Circle(SKETCH18_R)
        with Locations((27, -17)):
            Circle(SKETCH18_R)
    extrude(amount=-YTAB_THROUGH_HOLE_BACKING_RESTORATION_DEPTH)

    # Sketch19 → YTab_Blind_M2p5_Thread_Envelopes (cut)
    with BuildSketch(Plane.XZ):
        with Locations(Location((27, -23, 0), (0, 0, 270))):
            Circle(SKETCH19_R)
        with Locations(Location((27, -17, 0), (0, 0, 270))):
            Circle(SKETCH19_R)
    extrude(amount=-YTAB_BLIND_M2P5_THREAD_ENVELOPES_DEPTH, mode=Mode.SUBTRACT)


solid = part_2.part
